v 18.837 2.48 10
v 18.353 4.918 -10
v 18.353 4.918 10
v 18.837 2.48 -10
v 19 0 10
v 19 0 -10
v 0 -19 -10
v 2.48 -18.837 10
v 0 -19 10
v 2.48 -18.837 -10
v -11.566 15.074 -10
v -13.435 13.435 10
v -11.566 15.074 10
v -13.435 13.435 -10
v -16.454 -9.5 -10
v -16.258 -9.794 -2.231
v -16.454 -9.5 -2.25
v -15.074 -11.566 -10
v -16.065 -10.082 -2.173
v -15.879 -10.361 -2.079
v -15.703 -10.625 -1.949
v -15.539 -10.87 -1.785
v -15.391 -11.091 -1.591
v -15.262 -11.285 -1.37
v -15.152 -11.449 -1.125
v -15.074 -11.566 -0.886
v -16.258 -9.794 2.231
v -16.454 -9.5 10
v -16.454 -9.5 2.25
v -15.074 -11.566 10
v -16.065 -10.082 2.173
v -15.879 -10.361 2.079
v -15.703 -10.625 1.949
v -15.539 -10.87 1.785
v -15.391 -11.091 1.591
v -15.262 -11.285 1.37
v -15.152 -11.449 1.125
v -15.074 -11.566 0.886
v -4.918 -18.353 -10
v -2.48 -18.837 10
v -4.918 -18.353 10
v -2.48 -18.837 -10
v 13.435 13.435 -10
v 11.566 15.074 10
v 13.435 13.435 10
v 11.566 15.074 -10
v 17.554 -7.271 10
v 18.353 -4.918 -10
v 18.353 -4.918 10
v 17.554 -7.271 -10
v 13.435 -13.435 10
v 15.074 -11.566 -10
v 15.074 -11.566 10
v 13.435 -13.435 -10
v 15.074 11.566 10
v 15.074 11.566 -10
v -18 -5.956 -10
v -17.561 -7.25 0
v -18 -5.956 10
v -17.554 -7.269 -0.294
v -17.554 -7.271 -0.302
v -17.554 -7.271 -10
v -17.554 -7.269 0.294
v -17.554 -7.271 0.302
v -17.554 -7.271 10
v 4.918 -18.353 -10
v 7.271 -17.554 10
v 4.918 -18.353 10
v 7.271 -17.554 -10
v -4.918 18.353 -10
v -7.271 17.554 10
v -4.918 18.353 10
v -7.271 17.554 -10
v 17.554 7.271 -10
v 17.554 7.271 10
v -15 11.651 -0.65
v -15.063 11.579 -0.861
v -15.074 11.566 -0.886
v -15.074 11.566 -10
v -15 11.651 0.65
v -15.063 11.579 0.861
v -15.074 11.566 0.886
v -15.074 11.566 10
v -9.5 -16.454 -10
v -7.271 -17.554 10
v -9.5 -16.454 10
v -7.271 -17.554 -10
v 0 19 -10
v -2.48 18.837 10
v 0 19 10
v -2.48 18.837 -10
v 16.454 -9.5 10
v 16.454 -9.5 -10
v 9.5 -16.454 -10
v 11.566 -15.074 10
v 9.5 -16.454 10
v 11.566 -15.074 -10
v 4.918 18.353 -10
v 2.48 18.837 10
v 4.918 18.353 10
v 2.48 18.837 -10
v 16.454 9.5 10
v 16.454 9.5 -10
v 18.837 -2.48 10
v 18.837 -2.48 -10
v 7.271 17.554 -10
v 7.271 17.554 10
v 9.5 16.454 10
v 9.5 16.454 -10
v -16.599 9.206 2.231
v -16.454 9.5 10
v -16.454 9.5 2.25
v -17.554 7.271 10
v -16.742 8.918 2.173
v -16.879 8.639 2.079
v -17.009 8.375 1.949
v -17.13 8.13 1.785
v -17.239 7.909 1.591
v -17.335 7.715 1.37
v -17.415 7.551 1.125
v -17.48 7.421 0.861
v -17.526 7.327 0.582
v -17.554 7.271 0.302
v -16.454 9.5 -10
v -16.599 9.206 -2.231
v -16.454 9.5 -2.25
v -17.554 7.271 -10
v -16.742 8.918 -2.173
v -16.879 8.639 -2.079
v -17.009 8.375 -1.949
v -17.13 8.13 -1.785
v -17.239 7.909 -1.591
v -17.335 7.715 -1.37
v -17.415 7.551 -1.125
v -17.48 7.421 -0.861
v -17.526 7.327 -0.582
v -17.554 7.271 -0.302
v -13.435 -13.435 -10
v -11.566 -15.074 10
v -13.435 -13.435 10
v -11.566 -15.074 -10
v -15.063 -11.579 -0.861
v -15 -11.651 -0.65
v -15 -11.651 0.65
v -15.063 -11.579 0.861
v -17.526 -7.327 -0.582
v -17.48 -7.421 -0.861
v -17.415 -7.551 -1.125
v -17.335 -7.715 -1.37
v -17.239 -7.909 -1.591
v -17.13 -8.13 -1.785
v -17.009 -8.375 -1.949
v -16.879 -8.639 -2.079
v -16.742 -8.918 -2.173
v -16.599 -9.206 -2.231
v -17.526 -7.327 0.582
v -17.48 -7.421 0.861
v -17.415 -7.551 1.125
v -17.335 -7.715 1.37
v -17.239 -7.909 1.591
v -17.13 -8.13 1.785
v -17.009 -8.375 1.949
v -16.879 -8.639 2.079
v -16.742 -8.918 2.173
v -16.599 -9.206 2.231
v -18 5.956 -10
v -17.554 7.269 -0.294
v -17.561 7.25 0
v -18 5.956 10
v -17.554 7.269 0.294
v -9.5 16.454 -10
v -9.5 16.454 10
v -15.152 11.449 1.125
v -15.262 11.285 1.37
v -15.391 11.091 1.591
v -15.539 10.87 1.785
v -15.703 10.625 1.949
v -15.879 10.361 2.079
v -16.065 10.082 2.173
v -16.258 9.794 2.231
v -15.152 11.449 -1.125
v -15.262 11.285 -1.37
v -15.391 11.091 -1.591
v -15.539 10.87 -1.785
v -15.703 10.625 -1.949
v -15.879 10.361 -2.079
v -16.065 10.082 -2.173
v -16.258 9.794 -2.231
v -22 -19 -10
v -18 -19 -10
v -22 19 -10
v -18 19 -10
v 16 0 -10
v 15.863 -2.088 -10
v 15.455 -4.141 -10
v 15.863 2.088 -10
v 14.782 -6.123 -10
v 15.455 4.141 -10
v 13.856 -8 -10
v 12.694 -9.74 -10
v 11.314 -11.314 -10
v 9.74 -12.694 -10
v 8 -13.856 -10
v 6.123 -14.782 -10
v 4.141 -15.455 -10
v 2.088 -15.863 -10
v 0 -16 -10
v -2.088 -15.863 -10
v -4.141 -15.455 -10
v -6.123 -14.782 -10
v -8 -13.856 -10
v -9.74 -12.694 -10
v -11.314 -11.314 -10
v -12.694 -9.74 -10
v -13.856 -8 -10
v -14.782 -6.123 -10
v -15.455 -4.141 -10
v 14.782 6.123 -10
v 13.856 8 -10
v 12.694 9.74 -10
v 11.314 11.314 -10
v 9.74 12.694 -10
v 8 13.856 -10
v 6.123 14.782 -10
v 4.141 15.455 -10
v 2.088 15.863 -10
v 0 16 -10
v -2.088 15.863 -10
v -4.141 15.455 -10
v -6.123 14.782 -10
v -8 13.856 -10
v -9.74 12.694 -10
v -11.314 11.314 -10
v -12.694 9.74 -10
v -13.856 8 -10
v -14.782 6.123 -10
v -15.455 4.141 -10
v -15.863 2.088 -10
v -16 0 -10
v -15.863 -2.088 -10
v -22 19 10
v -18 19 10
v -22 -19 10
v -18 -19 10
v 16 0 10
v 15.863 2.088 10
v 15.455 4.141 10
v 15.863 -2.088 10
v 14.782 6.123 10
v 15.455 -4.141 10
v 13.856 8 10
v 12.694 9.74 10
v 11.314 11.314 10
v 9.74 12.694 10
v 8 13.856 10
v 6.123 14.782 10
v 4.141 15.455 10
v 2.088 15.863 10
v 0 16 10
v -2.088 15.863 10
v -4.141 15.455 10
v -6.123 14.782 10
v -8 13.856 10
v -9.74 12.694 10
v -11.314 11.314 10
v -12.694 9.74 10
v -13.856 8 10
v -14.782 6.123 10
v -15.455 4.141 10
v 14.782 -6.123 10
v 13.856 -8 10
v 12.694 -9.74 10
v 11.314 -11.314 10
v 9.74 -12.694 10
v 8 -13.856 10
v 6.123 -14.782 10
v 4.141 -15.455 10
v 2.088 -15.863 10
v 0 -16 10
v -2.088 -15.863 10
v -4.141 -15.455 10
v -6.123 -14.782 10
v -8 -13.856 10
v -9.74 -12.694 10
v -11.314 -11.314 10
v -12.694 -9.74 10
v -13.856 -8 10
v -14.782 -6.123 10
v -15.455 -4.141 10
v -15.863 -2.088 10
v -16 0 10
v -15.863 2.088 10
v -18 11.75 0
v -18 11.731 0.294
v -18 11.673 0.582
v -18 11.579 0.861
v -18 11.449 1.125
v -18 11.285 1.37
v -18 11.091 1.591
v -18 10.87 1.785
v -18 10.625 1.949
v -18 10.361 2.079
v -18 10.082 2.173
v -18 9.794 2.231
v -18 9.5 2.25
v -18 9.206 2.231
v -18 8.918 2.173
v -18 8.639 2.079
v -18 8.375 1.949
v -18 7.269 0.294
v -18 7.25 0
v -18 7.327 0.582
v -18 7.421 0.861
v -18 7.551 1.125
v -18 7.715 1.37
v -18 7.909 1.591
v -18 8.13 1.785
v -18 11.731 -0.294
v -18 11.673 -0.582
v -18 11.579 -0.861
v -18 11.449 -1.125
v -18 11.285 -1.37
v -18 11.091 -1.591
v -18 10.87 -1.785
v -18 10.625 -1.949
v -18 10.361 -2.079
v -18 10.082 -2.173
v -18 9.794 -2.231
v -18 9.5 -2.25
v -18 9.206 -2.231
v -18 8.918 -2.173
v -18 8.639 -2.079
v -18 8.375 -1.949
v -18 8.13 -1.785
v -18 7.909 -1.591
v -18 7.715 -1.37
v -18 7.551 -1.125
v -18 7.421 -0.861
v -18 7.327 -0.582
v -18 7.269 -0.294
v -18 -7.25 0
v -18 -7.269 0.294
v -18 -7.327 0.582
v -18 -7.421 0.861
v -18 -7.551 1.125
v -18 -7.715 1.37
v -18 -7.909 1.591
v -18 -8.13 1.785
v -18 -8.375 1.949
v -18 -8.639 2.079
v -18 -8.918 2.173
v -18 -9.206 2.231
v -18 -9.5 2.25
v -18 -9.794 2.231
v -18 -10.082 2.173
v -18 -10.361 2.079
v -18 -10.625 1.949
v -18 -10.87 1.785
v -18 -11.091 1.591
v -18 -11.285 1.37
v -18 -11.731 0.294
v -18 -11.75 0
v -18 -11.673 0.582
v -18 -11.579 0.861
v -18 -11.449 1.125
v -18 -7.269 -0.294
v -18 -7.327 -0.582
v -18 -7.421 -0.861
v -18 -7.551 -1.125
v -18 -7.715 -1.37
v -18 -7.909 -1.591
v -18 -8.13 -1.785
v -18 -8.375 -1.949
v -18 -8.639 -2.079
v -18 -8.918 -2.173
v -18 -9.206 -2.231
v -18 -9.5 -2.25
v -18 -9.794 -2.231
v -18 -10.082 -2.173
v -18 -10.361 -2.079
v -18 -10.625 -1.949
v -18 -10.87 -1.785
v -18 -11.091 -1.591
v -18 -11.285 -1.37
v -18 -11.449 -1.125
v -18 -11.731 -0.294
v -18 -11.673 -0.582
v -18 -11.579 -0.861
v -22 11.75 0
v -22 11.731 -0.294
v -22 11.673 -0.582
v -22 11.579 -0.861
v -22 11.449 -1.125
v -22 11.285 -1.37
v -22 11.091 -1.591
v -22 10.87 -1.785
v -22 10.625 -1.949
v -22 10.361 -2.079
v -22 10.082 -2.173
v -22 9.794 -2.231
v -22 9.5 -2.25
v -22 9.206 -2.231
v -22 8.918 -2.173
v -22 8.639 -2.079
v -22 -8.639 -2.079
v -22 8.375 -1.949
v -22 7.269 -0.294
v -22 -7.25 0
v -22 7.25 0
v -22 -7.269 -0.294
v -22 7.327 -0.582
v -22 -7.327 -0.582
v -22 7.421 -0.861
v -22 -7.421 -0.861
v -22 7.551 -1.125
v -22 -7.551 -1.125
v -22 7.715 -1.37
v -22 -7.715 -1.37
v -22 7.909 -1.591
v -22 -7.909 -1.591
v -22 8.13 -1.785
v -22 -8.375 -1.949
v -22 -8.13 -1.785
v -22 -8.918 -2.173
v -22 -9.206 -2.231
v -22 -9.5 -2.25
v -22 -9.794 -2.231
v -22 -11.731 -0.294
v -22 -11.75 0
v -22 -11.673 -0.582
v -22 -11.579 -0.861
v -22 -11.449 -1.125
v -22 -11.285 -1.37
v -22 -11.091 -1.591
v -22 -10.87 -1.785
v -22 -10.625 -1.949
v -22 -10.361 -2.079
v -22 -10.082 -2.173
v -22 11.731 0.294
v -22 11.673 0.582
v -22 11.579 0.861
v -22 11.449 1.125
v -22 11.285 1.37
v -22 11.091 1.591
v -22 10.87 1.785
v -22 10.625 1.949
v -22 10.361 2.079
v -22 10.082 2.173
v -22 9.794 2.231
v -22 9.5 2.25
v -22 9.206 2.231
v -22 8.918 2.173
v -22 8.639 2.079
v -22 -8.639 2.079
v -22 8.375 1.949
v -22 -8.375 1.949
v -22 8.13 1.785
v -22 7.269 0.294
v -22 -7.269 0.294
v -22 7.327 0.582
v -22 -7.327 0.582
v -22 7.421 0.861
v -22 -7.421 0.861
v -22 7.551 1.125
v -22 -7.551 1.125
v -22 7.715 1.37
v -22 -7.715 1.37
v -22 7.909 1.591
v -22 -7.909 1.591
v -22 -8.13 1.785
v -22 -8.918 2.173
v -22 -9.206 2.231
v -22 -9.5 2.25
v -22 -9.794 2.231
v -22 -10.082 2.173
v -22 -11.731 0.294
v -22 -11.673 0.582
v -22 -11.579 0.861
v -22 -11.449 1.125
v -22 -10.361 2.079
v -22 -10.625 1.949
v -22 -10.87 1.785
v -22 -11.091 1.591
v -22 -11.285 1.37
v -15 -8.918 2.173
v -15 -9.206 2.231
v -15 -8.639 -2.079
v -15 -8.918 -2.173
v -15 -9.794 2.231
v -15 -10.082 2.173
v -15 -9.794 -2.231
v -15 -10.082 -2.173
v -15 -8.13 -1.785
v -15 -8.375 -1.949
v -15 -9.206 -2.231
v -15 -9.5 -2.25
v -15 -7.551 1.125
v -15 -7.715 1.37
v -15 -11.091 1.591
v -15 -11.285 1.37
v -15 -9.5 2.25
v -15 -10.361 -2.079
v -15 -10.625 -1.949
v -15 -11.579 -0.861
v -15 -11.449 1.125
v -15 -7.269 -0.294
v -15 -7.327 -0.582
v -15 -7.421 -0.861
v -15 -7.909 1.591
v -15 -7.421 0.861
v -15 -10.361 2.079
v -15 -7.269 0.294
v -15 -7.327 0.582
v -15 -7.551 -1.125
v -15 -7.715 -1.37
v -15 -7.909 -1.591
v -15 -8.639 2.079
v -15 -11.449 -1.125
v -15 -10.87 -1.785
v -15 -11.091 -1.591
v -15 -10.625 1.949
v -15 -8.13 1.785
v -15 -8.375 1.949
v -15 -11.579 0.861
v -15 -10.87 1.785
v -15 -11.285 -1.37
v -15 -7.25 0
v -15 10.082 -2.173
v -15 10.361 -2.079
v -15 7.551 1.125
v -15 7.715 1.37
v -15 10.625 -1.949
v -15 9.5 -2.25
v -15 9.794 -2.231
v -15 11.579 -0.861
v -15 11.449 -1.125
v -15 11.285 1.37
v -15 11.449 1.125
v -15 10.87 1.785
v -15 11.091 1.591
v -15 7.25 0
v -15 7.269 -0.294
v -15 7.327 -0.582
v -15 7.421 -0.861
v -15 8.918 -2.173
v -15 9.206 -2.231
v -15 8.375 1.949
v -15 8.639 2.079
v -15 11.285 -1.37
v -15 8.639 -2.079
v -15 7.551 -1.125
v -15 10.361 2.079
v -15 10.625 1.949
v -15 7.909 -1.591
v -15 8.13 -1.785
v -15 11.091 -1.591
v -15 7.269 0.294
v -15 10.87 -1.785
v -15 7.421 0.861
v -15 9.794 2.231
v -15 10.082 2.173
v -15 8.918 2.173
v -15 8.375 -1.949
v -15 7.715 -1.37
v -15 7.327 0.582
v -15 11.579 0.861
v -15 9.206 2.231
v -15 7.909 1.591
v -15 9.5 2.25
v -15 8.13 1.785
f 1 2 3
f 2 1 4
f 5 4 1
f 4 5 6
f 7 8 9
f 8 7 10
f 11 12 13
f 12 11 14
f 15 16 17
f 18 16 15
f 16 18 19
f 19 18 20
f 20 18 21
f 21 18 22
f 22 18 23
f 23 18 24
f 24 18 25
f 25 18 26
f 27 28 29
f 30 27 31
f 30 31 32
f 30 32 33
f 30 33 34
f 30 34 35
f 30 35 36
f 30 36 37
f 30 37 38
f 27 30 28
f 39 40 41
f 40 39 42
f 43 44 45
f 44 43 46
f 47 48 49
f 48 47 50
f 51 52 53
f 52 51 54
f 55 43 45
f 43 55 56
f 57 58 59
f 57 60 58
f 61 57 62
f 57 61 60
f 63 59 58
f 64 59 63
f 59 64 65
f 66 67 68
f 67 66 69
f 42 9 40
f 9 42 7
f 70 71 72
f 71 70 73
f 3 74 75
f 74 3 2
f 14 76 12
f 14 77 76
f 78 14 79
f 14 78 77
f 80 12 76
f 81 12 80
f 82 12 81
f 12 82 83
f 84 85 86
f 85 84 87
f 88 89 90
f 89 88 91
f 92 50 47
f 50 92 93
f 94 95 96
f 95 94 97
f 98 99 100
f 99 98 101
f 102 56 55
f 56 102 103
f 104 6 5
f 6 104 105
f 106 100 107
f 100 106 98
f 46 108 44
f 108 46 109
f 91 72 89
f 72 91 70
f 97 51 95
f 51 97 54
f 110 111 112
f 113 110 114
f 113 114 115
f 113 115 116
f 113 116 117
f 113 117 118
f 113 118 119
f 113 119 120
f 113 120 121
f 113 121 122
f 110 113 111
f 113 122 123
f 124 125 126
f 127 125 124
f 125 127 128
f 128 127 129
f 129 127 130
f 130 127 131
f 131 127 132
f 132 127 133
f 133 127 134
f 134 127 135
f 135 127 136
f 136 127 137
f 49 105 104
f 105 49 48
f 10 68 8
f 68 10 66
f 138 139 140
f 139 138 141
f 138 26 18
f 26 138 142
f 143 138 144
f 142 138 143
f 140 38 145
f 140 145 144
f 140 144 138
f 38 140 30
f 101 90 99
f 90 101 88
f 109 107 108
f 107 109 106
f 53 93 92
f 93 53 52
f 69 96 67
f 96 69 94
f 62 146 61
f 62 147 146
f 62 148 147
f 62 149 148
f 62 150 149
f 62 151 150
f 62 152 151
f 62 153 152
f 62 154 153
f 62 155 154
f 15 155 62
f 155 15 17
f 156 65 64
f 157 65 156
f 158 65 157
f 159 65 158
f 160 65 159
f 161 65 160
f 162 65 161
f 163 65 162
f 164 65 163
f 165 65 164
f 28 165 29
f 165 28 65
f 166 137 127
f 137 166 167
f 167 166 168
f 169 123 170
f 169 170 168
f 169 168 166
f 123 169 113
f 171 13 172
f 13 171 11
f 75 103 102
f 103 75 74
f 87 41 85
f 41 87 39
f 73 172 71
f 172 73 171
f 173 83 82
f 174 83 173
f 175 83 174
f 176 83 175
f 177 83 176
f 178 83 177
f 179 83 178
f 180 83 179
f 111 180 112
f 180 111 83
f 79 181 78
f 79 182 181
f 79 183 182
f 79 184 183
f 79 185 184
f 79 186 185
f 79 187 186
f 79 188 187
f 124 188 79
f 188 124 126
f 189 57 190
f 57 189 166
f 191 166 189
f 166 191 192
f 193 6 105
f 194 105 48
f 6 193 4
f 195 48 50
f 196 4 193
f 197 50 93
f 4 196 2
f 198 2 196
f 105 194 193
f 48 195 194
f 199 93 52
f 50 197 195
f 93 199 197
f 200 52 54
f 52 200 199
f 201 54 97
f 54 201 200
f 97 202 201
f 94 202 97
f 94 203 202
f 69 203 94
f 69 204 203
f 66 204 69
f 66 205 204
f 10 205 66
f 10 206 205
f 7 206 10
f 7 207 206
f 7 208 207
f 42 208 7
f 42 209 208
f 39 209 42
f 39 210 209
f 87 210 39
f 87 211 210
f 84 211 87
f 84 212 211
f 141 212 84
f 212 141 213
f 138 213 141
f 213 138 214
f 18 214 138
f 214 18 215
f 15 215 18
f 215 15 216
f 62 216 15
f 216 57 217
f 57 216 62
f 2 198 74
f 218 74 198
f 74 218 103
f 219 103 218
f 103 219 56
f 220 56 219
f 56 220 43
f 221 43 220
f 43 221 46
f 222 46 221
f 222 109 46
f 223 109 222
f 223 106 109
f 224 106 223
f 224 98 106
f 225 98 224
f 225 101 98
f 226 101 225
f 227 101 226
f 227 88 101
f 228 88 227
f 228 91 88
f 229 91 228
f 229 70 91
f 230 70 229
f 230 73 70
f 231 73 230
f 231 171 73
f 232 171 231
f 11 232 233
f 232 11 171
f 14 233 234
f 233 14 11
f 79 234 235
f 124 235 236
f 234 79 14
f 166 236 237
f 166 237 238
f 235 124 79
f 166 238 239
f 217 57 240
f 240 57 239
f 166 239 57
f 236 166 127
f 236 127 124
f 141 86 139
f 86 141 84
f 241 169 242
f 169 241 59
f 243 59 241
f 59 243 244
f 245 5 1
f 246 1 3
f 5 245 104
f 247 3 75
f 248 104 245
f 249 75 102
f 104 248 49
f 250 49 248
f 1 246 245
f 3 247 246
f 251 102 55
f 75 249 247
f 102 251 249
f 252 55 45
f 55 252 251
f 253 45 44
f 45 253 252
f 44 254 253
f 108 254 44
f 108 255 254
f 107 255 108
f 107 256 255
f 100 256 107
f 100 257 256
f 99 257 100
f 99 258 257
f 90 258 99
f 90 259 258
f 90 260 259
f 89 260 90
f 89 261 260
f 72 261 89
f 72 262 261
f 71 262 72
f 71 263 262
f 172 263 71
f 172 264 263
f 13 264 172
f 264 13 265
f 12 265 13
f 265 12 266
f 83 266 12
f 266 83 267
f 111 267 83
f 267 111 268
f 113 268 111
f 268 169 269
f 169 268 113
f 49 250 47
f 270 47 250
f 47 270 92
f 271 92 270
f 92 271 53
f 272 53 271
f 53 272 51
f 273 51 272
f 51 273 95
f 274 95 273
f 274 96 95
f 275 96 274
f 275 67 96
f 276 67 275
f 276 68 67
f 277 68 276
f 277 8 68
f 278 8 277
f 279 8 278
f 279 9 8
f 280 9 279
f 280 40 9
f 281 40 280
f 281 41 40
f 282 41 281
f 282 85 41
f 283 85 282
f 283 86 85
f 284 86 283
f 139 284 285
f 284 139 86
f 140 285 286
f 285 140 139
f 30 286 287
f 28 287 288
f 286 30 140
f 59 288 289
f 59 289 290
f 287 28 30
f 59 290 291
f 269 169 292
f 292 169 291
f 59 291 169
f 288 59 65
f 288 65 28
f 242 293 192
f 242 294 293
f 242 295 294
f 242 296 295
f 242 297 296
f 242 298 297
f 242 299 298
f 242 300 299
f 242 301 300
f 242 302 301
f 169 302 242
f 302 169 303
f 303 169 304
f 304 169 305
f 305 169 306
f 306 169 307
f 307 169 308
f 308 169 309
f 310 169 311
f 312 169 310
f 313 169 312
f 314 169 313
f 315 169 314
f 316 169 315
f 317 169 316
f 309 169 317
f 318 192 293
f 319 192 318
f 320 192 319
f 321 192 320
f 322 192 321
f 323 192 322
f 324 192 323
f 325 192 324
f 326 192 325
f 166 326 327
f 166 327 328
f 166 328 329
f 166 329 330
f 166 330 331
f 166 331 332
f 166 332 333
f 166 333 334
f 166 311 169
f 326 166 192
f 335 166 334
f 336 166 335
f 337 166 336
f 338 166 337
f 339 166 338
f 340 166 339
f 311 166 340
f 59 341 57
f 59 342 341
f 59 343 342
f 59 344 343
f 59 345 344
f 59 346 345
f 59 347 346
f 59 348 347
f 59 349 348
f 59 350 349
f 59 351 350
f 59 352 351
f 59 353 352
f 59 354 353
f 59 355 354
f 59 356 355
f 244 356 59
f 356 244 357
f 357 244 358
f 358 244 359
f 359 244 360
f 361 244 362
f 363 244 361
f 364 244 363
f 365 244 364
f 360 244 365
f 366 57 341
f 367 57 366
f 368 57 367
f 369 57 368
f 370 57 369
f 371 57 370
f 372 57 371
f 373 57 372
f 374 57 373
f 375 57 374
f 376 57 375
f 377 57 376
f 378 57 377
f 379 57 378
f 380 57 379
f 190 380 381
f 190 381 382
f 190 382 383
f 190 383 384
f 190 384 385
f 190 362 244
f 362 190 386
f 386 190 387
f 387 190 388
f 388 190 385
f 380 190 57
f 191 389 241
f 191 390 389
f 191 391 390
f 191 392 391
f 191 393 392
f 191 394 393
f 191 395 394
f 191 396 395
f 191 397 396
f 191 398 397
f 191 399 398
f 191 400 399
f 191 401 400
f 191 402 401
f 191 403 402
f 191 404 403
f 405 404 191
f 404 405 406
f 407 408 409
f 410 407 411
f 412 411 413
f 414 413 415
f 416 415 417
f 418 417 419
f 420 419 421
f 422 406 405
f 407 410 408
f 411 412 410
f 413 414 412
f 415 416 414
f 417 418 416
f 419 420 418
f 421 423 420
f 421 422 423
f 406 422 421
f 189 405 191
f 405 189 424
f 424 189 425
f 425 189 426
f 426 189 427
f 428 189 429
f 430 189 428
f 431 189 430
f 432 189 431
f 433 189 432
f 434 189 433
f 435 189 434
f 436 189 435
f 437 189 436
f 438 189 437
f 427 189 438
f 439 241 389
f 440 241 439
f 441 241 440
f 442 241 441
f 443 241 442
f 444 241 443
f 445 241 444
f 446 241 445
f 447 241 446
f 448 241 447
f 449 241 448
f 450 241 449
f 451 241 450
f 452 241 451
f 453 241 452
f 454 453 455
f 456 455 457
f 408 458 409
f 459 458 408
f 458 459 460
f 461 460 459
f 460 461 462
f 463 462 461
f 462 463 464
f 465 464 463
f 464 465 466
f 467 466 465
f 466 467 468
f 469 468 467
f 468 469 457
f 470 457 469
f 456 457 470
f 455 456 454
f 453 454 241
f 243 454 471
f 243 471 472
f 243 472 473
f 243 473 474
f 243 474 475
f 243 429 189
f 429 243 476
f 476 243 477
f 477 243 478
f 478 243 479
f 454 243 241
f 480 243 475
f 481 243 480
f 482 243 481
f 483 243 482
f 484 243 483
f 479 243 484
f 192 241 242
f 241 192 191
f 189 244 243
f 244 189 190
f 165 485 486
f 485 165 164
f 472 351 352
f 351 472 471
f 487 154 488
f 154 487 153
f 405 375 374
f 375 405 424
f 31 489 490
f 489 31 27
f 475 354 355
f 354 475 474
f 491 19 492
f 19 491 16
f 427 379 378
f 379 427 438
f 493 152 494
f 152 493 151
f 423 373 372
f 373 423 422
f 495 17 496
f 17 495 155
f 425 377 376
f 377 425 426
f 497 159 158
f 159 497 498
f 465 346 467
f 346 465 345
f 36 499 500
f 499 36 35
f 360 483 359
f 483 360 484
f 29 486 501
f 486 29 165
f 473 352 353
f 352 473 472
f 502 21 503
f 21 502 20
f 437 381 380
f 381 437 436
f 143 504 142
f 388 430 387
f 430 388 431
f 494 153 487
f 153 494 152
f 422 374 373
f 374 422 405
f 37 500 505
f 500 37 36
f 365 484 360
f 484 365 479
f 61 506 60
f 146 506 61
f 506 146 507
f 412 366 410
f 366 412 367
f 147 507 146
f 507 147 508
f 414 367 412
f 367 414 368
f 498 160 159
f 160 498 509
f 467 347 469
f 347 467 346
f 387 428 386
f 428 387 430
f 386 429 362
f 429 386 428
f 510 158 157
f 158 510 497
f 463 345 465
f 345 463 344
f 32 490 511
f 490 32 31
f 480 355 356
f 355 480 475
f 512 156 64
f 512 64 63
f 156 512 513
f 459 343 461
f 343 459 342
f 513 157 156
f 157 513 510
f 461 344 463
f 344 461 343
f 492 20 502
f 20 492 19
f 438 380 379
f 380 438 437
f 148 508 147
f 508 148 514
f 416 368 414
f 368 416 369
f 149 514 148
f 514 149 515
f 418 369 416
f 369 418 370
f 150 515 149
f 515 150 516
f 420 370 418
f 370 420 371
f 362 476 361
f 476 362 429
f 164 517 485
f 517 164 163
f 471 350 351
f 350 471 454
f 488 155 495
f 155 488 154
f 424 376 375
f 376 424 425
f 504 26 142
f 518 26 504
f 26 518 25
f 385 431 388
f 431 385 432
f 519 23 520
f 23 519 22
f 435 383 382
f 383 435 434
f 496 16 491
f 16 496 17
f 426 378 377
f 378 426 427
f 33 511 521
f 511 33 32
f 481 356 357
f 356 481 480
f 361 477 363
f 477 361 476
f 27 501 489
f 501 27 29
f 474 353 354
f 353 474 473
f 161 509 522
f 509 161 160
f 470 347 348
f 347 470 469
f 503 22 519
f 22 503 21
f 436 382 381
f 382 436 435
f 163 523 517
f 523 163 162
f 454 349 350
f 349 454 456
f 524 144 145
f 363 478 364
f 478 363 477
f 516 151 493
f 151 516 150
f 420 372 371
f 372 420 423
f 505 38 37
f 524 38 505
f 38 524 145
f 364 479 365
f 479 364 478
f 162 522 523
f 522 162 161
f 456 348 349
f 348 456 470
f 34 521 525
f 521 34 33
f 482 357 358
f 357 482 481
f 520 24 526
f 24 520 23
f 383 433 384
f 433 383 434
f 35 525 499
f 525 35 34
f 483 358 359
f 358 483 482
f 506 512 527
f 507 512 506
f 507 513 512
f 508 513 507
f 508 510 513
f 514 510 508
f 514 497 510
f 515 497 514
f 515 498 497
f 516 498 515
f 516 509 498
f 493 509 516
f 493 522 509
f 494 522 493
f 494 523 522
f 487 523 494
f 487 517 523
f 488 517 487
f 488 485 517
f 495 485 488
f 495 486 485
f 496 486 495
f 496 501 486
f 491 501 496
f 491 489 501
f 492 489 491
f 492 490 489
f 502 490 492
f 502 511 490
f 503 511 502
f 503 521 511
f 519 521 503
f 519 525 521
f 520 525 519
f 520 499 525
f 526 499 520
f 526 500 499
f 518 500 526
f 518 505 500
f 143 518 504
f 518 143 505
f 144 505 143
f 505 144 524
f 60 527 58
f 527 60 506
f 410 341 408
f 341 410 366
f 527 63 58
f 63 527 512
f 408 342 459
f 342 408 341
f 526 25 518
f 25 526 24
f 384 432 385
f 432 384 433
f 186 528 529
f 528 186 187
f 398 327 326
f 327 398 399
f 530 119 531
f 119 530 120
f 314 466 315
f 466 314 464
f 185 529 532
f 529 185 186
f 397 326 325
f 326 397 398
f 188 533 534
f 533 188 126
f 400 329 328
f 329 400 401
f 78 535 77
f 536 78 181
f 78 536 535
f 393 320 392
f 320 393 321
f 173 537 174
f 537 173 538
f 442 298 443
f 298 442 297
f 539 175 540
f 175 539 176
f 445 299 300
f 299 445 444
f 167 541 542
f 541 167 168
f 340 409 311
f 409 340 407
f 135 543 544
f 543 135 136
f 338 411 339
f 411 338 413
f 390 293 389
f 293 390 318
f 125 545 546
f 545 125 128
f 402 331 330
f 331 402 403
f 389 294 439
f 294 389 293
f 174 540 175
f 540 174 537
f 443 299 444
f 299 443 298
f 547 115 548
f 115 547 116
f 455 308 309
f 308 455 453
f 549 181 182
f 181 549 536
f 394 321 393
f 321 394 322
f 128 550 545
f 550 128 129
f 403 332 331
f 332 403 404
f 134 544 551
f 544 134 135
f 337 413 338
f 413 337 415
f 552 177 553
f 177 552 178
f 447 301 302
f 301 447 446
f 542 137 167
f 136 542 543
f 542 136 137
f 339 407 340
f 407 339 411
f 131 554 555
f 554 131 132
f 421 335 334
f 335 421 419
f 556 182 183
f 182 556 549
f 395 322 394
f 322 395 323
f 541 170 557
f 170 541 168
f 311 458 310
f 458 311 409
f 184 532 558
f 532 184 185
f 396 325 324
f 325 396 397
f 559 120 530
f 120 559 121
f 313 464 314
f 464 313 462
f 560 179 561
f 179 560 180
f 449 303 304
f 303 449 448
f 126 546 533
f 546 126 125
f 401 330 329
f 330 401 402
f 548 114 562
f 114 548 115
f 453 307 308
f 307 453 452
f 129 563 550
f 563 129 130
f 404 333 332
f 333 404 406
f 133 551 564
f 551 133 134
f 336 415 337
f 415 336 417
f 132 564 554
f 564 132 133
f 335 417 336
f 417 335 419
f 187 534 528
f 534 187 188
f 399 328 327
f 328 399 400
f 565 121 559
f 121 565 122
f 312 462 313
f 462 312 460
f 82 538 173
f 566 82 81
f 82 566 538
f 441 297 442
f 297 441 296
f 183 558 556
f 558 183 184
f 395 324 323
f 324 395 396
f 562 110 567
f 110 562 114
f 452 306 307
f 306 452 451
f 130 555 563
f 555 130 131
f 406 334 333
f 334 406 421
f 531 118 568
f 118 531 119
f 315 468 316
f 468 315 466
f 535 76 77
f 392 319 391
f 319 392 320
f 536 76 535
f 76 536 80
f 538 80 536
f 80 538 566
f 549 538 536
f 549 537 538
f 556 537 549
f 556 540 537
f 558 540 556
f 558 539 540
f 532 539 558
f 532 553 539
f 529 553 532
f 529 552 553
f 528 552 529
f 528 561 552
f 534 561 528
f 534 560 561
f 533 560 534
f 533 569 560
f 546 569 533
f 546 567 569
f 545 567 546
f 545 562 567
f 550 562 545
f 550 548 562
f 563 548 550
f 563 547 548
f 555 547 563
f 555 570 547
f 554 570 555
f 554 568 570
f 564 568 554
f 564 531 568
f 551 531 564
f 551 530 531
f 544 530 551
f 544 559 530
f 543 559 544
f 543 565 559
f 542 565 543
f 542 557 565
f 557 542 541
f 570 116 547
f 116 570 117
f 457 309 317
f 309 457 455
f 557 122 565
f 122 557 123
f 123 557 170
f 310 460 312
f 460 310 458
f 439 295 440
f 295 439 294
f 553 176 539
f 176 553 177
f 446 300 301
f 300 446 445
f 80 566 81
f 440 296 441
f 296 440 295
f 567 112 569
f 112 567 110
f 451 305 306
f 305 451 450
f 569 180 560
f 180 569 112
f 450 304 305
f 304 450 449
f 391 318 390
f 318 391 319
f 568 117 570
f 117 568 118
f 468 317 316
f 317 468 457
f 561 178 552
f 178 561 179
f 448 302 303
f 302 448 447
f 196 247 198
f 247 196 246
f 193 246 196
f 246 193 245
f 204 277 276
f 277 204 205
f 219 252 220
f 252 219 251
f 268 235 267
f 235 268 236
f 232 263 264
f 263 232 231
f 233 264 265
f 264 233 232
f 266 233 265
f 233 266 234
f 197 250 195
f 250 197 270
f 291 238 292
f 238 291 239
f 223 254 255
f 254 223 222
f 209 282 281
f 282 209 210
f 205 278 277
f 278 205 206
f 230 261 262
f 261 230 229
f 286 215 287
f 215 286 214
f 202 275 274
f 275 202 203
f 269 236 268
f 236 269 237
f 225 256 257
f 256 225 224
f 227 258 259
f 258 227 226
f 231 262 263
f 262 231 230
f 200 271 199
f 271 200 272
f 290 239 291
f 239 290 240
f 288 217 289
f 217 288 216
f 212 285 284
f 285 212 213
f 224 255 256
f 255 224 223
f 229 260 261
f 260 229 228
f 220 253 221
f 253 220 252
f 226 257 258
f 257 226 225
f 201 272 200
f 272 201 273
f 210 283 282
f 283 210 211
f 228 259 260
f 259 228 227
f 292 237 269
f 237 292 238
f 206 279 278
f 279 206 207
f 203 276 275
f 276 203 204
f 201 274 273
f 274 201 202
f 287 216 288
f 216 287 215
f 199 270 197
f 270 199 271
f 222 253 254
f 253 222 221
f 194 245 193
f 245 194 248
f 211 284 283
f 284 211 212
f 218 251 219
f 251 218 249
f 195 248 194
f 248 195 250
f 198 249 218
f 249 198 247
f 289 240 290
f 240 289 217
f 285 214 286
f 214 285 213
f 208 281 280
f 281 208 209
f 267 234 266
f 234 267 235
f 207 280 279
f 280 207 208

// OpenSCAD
// Scenario A2 fixture — a wall-mount pipe clamp (Issue #35).
//
// This is a HAND-AUTHORED fixture, deliberately not agent output: the
// preview/server agreement measurement has to be reproducible run over run,
// and a model the agent re-authors each time would make a divergence
// impossible to attribute. It follows the same conventions the agent's system
// prompt demands (mm, Customizer annotations, parameters first, helpers
// second, geometry last) so the Params tab and `--export-format=param` see a
// realistic schema.
//
// Properties the harness relies on:
//   - one fused solid (components == 1) so the export validation gate passes;
//   - genus 3 (bore + two screw holes) so the comparison covers real topology,
//     not just a convex blob;
//   - volume strictly INCREASING in `wall`, and outer bbox growing by exactly
//     1mm per axis per 1mm of `wall` — both checkable in closed form;
//   - the backplate overlaps the clamp ring by 1mm at every legal `wall`, so
//     the union never degenerates into two touching-but-disjoint bodies.
//
// SPDX-License-Identifier: GPL-3.0-or-later

/* [Clamp] */
// Pipe outside diameter (mm)
pipe_dia = 32;   // [10:1:80]
// Clamp wall thickness (mm)
wall = 3;        // [1:0.5:10]
// Bracket width along the pipe axis (mm)
width = 20;      // [8:1:60]

/* [Backplate] */
// Backplate thickness (mm)
plate = 4;       // [2:0.5:12]
// Screw hole diameter (mm)
screw_dia = 4.5; // [2:0.1:8]

/* [Quality] */
// Facets per full circle
$fn = 48;        // [24:8:96]

outer_r = pipe_dia / 2 + wall;
plate_h = pipe_dia + 2 * wall;

module clamp() {
  difference() {
    union() {
      cylinder(h = width, r = outer_r, center = true);
      // -plate/2 + 1 keeps a 1mm overlap with the ring at every `wall`.
      translate([-outer_r - plate / 2 + 1, 0, 0])
        cube([plate, plate_h, width], center = true);
    }
    // Pipe bore, run past both faces so it reads as a through-hole.
    cylinder(h = width + 2, d = pipe_dia, center = true);
    // Two screw holes through the backplate, along X.
    for (dy = [-1, 1])
      translate([-outer_r - plate, dy * plate_h / 4, 0])
        rotate([0, 90, 0])
          cylinder(h = plate + 4, d = screw_dia, center = false);
  }
}

clamp();
